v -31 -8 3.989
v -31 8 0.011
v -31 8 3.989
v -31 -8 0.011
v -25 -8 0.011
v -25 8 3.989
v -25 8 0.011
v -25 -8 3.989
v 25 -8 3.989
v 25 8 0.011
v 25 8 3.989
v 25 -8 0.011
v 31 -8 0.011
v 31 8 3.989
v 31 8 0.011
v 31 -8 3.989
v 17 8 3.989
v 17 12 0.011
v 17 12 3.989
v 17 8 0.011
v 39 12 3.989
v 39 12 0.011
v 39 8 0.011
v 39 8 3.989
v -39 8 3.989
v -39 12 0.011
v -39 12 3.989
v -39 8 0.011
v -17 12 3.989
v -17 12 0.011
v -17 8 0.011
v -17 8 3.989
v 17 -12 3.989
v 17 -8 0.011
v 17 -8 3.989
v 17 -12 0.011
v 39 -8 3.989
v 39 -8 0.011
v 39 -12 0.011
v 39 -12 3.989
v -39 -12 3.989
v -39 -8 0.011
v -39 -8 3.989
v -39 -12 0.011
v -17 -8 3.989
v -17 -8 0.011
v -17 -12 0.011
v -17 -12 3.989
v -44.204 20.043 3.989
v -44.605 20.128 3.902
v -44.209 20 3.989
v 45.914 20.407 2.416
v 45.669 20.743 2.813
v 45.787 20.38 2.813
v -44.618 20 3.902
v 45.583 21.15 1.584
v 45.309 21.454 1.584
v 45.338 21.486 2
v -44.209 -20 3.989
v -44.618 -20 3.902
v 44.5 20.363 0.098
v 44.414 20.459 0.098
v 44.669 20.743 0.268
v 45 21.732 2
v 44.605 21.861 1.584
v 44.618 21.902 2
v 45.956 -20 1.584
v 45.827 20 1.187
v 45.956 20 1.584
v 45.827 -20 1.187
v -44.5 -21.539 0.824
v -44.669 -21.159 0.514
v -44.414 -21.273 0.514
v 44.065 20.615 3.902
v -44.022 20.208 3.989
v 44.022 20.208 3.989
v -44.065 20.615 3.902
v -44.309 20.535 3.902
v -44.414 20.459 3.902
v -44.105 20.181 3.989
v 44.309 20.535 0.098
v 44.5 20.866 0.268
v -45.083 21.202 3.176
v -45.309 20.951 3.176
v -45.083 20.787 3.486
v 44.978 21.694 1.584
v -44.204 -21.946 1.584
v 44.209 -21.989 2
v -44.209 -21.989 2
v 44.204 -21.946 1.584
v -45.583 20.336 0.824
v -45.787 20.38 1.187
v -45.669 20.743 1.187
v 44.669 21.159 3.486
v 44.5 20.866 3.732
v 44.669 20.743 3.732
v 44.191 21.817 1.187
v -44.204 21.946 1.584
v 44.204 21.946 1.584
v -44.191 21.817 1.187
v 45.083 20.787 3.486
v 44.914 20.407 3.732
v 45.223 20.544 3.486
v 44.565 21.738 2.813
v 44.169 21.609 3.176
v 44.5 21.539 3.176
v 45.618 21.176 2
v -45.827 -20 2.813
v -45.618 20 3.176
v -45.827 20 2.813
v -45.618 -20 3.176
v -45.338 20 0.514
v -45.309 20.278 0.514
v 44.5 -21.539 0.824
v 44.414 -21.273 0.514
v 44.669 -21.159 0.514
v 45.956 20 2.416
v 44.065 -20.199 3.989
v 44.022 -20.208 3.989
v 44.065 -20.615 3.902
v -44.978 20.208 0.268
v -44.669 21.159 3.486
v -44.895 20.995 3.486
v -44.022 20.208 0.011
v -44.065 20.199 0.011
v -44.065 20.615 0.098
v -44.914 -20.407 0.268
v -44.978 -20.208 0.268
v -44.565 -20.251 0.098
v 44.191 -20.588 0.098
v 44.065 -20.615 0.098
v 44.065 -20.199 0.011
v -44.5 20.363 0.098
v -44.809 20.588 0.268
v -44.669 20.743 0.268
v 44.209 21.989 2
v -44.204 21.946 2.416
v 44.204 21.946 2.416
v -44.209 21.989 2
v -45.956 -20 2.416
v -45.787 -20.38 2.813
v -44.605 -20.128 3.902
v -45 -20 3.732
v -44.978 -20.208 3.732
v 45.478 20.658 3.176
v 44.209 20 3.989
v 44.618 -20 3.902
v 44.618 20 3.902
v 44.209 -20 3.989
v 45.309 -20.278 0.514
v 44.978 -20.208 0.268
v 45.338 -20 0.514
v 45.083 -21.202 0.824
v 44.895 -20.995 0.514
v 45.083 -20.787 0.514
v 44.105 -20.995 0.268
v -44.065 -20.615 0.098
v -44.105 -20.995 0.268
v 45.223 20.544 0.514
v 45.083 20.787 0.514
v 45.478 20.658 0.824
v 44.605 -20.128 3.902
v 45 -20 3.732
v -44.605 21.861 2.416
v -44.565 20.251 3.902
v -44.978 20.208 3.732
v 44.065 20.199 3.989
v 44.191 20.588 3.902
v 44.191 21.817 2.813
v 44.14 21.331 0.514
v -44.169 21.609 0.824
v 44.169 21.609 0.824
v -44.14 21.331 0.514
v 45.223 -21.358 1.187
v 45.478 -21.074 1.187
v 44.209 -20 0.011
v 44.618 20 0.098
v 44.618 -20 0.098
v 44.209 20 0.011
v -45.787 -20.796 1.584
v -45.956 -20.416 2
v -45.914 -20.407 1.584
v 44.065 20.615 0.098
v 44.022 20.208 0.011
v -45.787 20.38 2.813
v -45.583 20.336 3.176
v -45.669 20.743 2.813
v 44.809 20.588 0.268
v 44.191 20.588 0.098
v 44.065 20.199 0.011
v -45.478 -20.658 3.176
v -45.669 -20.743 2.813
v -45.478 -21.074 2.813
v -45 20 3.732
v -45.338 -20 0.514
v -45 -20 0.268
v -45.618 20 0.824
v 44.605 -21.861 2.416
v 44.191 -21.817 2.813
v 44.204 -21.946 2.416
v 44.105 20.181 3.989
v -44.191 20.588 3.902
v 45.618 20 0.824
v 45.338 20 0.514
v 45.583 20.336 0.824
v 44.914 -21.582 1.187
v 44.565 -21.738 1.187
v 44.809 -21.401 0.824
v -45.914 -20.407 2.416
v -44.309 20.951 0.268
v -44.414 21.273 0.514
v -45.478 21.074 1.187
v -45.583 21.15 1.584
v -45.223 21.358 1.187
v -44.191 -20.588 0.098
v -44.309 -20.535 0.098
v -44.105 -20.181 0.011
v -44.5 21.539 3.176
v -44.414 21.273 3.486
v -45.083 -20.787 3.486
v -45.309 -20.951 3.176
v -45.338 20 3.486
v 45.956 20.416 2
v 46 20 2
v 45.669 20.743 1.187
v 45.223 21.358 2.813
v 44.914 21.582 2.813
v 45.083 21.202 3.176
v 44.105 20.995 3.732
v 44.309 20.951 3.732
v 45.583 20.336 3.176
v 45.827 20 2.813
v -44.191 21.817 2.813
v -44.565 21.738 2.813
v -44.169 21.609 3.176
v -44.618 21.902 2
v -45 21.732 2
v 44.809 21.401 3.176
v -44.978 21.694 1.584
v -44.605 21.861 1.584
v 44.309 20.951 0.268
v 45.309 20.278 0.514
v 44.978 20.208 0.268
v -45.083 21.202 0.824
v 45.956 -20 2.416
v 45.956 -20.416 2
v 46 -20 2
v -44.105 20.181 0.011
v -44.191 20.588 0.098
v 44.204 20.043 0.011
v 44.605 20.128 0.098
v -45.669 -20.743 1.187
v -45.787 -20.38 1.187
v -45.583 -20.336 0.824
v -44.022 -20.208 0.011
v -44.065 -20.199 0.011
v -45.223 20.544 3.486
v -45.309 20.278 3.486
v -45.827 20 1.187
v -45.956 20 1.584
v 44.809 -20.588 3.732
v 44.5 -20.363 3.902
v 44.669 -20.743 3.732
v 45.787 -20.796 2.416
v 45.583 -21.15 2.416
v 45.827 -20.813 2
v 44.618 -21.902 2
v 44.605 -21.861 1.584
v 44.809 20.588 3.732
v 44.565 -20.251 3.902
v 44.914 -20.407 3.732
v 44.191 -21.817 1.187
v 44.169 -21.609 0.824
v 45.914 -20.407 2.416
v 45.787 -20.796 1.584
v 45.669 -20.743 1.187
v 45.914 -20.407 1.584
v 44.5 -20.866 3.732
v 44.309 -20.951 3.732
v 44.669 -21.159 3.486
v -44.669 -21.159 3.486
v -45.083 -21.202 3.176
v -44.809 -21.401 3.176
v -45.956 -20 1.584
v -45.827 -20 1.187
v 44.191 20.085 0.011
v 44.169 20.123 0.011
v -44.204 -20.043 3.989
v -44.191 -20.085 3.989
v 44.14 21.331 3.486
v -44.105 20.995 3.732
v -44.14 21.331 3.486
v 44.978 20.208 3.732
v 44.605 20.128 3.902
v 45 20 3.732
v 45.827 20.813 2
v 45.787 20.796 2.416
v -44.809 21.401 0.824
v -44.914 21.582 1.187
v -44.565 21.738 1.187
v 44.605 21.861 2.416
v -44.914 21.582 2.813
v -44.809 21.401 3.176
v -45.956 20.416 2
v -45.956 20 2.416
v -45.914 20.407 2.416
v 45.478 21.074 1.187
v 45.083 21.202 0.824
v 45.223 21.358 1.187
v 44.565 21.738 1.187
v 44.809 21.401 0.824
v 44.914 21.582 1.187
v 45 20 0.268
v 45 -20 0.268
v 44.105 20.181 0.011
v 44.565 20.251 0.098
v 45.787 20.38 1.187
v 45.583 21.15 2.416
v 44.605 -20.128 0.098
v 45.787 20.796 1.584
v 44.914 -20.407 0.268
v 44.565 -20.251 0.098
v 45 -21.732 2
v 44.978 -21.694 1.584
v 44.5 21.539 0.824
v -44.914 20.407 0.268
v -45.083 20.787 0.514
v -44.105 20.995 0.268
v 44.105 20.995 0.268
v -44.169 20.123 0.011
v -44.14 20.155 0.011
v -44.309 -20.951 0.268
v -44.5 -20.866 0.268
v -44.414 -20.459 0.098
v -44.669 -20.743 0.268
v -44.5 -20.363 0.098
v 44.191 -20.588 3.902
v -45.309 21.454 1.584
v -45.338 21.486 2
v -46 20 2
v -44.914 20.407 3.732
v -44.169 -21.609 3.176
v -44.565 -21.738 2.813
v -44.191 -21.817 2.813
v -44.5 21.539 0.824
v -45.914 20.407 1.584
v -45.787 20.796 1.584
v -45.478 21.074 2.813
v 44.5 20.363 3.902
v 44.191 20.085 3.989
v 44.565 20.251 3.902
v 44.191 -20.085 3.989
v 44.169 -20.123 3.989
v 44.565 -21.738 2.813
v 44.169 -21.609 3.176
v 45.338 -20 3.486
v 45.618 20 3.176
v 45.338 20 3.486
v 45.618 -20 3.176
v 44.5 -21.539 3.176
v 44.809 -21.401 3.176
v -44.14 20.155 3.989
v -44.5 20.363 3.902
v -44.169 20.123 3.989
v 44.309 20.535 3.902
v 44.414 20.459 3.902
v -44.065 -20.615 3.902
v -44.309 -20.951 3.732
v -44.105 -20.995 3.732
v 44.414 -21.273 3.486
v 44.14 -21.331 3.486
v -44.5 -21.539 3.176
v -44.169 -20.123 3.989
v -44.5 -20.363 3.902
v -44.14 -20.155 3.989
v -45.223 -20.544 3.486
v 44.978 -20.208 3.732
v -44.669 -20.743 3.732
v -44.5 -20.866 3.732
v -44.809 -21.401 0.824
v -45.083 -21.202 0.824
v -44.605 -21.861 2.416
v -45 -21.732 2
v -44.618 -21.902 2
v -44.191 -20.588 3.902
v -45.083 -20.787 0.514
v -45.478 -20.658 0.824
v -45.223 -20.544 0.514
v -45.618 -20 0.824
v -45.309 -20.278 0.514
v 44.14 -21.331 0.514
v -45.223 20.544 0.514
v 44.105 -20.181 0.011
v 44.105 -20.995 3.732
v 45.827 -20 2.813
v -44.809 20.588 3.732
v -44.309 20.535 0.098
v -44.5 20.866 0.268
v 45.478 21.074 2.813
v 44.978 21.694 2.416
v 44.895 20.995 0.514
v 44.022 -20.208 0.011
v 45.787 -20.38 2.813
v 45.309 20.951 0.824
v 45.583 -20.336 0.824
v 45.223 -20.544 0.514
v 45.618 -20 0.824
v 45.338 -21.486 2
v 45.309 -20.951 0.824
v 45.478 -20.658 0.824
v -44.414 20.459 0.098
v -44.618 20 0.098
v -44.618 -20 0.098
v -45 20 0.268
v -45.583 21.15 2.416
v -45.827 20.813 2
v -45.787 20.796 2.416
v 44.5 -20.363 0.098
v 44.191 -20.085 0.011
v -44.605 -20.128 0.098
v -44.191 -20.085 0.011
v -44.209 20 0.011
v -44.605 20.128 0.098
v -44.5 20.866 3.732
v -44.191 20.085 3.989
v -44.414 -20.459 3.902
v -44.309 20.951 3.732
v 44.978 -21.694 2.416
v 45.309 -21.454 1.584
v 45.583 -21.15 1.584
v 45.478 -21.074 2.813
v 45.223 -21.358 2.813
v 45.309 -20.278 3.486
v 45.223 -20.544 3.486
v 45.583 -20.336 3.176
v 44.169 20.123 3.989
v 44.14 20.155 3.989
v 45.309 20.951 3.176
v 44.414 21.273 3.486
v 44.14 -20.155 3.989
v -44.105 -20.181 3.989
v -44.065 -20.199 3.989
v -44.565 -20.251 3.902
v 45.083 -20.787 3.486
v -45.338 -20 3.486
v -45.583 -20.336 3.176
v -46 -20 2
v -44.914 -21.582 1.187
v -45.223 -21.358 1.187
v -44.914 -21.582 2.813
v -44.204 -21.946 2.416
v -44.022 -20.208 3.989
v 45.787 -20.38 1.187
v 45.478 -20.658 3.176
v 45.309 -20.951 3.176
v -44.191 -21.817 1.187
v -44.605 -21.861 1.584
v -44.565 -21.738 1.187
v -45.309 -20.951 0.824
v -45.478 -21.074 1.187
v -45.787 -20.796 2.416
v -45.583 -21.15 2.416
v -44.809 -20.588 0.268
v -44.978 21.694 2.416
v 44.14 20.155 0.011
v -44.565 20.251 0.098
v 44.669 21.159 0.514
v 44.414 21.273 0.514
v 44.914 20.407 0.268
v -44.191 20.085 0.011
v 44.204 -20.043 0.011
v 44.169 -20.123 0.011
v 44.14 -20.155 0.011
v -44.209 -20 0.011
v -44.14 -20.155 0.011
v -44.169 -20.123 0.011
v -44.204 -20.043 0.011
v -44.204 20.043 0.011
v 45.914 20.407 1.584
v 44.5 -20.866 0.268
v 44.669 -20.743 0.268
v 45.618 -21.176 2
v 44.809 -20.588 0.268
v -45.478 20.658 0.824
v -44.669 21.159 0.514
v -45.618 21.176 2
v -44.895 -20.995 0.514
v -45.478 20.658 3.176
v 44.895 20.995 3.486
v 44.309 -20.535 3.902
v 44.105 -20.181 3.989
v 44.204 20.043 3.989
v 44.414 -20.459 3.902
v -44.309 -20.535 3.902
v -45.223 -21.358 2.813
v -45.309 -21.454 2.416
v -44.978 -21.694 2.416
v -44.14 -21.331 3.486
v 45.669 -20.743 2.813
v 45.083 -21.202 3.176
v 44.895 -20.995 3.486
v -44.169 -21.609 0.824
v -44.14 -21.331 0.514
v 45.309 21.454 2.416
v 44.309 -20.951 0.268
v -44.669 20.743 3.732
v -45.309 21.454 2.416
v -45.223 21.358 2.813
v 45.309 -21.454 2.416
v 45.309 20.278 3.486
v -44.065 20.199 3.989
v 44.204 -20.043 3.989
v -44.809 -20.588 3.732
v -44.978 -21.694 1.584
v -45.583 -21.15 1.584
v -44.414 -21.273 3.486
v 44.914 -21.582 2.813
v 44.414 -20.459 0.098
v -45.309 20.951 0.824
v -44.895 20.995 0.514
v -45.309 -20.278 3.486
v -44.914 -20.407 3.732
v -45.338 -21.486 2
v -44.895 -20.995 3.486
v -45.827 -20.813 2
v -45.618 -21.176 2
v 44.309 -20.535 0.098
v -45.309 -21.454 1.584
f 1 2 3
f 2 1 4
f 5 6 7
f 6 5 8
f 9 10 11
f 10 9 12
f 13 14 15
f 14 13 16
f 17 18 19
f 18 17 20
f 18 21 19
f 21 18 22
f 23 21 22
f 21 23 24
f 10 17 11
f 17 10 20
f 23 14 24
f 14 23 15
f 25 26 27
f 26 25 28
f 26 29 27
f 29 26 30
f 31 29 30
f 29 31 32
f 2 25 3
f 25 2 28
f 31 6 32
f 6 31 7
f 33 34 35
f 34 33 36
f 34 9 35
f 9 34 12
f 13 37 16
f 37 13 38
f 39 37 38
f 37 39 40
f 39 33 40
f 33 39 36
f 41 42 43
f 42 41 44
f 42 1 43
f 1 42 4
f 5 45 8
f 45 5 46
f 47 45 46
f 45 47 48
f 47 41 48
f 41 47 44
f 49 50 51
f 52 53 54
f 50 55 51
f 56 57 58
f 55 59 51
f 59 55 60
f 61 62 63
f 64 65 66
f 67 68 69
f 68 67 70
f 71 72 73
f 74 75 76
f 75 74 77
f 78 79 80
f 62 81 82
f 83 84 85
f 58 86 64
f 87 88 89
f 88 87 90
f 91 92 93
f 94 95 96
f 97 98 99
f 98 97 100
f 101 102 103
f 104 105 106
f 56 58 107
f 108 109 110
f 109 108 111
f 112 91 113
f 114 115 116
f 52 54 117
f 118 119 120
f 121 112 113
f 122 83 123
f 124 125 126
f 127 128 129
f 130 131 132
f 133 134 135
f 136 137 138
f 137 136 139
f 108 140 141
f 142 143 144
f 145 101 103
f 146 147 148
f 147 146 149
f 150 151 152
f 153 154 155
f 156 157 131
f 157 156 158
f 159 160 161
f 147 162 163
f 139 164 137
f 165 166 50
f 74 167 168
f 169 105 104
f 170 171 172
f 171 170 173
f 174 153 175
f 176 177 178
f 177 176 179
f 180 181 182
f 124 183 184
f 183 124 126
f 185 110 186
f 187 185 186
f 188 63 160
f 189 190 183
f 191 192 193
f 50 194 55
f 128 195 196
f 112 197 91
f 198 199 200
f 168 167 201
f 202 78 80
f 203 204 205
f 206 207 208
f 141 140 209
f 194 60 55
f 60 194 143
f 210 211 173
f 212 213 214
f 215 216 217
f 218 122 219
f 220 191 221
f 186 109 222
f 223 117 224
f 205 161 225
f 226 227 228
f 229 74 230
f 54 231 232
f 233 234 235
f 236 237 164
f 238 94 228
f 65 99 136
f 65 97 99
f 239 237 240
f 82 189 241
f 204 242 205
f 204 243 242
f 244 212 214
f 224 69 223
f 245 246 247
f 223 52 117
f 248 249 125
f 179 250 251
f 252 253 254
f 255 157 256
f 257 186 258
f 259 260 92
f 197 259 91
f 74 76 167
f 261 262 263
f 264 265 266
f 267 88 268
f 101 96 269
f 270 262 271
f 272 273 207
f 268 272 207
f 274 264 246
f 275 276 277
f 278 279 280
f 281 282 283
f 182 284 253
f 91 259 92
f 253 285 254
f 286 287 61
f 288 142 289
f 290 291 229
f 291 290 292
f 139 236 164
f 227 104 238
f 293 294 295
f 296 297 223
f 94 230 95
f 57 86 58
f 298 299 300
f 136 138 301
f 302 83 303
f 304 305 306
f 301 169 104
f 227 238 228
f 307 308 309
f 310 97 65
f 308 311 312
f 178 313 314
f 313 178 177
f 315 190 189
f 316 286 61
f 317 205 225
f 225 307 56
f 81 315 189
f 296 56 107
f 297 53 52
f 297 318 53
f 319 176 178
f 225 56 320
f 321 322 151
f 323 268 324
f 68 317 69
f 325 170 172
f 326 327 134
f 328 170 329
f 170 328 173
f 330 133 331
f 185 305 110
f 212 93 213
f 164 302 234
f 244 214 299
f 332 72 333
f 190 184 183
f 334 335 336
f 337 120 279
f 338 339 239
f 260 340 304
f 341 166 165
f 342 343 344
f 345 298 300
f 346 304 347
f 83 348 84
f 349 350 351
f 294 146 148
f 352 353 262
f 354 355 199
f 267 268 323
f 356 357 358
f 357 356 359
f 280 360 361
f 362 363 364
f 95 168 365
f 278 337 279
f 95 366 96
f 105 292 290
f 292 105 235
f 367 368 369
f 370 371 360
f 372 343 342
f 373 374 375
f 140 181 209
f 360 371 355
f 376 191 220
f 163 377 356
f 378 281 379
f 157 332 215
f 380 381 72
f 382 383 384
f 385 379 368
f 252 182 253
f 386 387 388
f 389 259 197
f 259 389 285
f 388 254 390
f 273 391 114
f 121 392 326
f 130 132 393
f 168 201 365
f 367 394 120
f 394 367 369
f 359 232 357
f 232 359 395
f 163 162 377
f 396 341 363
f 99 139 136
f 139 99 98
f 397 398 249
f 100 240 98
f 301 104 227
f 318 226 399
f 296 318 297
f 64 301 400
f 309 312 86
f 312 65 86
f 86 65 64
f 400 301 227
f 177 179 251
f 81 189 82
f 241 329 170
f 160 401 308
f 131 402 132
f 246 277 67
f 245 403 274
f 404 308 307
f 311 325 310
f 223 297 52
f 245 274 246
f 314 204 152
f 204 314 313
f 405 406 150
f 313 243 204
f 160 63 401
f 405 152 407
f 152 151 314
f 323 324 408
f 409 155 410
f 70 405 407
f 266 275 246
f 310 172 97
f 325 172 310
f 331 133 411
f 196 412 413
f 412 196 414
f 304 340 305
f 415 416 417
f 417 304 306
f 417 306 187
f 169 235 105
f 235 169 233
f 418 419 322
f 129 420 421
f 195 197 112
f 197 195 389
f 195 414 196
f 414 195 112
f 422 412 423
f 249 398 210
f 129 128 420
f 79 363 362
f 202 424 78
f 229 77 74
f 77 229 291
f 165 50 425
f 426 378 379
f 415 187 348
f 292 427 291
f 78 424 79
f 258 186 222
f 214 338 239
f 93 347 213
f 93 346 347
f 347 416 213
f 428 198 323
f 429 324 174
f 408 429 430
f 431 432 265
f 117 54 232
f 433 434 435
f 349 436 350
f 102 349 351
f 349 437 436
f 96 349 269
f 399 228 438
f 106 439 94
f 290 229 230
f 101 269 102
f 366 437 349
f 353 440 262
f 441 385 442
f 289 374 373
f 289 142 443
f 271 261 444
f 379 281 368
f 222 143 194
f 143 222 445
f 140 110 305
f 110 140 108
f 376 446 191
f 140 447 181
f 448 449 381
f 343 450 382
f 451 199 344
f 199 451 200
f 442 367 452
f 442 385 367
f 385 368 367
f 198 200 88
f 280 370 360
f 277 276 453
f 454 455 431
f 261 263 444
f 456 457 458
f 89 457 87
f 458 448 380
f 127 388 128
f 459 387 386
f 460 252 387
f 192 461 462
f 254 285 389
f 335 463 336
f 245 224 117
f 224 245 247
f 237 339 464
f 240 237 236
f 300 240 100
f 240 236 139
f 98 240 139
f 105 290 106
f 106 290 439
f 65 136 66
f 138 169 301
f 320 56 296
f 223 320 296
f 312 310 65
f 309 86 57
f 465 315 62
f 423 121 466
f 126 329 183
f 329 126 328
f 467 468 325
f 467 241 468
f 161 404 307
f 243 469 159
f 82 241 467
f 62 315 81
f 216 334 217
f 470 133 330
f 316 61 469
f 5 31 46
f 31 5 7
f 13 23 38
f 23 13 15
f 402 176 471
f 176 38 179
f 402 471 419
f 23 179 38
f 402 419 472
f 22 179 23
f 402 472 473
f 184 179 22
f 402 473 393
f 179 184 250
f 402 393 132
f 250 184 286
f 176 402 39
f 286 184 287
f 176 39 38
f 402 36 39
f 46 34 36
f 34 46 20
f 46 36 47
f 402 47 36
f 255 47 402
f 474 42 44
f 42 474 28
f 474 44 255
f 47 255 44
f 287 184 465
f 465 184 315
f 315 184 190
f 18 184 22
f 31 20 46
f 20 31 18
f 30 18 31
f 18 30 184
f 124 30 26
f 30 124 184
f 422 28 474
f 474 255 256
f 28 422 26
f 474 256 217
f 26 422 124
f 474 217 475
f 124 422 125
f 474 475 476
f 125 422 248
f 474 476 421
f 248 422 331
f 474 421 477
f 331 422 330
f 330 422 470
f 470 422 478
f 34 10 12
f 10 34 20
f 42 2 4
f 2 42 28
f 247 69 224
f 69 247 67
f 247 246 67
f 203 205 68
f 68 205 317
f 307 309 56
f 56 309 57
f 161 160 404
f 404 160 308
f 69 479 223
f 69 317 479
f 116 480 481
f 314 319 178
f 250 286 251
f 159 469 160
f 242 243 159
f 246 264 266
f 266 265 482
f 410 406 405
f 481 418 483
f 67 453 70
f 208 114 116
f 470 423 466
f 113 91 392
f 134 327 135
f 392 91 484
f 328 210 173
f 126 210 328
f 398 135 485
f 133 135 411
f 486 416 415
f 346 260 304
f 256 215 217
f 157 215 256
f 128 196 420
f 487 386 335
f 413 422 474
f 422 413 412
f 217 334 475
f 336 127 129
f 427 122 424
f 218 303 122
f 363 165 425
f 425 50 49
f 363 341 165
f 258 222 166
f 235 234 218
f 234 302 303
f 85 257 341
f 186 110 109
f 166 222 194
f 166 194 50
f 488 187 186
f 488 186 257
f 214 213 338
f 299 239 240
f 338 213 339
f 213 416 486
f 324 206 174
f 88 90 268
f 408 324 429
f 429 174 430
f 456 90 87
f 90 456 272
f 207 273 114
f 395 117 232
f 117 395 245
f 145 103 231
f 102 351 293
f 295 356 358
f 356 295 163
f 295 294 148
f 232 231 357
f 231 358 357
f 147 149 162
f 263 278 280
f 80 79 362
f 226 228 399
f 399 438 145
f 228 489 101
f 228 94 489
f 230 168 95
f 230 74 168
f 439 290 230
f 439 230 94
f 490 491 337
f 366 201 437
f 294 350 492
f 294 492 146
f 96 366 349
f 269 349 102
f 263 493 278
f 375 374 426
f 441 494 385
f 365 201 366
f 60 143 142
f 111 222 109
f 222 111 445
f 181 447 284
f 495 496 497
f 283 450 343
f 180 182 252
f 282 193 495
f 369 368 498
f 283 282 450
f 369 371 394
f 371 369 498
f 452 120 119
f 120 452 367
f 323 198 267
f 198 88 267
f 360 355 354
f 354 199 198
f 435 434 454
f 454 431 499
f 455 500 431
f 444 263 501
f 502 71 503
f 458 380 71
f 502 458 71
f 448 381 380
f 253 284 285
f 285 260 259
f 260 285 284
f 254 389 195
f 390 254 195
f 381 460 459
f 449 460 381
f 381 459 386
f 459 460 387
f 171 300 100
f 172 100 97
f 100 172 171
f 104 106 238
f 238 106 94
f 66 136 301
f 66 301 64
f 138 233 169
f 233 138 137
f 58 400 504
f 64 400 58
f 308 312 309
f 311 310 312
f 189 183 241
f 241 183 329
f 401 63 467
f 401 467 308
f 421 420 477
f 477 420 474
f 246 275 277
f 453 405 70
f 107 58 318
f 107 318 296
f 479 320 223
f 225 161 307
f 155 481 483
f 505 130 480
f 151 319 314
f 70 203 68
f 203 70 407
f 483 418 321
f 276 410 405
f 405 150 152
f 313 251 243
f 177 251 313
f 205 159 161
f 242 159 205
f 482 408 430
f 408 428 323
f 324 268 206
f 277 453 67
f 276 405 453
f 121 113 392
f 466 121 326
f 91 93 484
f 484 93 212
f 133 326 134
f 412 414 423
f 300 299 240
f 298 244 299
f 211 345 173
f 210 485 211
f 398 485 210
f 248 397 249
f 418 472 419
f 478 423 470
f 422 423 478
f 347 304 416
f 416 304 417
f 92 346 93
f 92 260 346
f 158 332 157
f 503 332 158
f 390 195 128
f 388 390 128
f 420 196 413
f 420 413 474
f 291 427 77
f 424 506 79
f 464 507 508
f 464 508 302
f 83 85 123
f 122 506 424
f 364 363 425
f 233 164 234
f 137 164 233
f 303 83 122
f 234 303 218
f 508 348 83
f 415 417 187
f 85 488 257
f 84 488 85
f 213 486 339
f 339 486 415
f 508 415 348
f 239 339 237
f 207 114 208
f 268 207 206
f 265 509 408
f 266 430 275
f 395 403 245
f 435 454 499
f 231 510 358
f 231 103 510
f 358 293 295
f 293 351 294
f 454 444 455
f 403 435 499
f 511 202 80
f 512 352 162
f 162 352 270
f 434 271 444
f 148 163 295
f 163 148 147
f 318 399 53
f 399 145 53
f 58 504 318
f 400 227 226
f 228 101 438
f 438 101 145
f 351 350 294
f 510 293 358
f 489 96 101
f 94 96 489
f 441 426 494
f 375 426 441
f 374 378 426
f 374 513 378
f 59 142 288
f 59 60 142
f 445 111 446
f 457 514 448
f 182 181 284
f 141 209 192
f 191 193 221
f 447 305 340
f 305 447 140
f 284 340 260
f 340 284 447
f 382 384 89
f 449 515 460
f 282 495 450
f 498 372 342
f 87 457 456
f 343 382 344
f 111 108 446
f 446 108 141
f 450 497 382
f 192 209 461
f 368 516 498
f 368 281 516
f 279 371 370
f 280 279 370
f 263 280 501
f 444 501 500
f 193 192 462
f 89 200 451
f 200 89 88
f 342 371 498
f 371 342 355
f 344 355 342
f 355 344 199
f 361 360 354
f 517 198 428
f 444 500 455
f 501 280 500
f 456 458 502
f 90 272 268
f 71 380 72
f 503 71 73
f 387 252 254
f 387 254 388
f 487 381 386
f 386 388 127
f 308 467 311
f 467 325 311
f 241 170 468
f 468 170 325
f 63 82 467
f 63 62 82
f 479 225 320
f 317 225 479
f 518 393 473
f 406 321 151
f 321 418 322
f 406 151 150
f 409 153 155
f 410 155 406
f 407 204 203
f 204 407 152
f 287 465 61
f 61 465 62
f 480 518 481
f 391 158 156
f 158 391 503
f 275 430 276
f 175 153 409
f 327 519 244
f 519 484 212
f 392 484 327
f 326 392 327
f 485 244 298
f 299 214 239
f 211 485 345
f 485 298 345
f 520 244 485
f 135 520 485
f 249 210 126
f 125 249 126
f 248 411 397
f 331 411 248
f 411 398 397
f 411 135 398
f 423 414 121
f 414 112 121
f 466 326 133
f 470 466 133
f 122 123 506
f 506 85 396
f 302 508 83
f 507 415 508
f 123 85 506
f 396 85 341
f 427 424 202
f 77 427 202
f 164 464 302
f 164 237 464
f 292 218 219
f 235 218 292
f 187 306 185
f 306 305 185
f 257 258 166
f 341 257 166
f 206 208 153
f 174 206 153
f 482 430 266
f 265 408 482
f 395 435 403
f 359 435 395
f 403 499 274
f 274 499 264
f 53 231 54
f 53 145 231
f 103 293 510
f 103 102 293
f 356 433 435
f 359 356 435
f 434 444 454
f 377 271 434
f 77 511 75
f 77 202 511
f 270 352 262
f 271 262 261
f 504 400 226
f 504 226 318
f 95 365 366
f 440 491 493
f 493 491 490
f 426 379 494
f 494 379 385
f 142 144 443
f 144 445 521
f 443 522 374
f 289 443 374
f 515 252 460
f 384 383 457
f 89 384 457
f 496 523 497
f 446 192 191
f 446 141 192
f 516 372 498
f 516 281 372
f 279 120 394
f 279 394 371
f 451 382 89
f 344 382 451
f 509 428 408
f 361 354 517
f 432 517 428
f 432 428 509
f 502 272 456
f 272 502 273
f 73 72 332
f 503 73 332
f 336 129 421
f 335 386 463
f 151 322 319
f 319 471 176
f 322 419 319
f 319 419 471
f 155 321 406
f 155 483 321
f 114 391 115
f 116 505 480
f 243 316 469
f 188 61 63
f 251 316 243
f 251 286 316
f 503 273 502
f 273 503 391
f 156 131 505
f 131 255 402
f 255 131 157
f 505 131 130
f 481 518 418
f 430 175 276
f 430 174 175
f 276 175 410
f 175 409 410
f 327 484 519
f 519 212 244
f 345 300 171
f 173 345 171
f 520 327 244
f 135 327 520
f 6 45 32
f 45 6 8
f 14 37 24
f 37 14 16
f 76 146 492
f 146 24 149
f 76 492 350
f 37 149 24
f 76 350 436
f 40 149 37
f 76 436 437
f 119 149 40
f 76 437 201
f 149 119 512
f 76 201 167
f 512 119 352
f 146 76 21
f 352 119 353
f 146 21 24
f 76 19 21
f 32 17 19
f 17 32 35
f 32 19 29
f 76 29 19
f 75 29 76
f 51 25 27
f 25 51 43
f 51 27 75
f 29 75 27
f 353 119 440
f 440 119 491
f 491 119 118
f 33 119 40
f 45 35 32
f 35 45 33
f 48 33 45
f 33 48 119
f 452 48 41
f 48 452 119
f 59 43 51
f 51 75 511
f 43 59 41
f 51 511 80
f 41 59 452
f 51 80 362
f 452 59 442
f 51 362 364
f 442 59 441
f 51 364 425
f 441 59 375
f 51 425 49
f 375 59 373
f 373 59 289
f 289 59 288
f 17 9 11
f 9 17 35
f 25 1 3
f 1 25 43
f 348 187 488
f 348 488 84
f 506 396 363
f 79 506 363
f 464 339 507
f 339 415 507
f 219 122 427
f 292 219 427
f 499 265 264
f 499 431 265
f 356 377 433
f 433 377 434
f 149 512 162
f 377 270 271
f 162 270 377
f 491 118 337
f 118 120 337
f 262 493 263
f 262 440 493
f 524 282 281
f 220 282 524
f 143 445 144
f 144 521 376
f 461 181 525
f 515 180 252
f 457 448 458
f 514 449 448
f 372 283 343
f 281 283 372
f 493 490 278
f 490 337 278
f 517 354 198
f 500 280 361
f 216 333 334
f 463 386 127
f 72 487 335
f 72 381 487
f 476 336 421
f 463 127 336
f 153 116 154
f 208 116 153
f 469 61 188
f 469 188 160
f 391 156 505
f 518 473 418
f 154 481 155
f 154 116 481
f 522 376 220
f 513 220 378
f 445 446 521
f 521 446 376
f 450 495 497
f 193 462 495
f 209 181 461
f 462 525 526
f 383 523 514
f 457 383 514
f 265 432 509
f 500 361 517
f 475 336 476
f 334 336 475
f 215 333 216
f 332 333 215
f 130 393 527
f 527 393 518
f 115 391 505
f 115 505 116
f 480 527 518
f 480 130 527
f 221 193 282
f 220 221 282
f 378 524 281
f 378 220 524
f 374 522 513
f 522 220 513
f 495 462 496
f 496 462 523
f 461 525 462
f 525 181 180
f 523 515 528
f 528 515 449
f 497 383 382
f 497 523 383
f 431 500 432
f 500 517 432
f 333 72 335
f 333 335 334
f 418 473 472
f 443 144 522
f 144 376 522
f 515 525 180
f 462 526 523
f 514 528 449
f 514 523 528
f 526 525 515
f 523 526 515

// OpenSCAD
// Generated by SolidPython 1.1.3 on 2022-08-14 15:47:18


difference() {
	translate(v = [-44.0000000000, -20.0000000000, 2.0000000000]) {
		hull() {
			translate(v = [88, 0]) {
				sphere($fn = 30, d = 4);
			}
			translate(v = [88, 40]) {
				sphere($fn = 30, d = 4);
			}
			translate(v = [0, 0]) {
				sphere($fn = 30, d = 4);
			}
			translate(v = [0, 40]) {
				sphere($fn = 30, d = 4);
			}
		}
	}
	union() {
		linear_extrude(height = 5) {
			translate(v = [28, 10]) {
				square(center = true, size = [22, 4]);
			}
		}
		linear_extrude(height = 5) {
			translate(v = [-28, 10]) {
				square(center = true, size = [22, 4]);
			}
		}
		linear_extrude(height = 5) {
			translate(v = [28, -10]) {
				square(center = true, size = [22, 4]);
			}
		}
		linear_extrude(height = 5) {
			translate(v = [-28, -10]) {
				square(center = true, size = [22, 4]);
			}
		}
		union() {
			linear_extrude(height = 5) {
				translate(v = [-28, 0]) {
					square(center = true, size = [6.0000000000, 20]);
				}
			}
			linear_extrude(height = 5) {
				translate(v = [28, 0]) {
					square(center = true, size = [6.0000000000, 20]);
				}
			}
		}
	}
}
